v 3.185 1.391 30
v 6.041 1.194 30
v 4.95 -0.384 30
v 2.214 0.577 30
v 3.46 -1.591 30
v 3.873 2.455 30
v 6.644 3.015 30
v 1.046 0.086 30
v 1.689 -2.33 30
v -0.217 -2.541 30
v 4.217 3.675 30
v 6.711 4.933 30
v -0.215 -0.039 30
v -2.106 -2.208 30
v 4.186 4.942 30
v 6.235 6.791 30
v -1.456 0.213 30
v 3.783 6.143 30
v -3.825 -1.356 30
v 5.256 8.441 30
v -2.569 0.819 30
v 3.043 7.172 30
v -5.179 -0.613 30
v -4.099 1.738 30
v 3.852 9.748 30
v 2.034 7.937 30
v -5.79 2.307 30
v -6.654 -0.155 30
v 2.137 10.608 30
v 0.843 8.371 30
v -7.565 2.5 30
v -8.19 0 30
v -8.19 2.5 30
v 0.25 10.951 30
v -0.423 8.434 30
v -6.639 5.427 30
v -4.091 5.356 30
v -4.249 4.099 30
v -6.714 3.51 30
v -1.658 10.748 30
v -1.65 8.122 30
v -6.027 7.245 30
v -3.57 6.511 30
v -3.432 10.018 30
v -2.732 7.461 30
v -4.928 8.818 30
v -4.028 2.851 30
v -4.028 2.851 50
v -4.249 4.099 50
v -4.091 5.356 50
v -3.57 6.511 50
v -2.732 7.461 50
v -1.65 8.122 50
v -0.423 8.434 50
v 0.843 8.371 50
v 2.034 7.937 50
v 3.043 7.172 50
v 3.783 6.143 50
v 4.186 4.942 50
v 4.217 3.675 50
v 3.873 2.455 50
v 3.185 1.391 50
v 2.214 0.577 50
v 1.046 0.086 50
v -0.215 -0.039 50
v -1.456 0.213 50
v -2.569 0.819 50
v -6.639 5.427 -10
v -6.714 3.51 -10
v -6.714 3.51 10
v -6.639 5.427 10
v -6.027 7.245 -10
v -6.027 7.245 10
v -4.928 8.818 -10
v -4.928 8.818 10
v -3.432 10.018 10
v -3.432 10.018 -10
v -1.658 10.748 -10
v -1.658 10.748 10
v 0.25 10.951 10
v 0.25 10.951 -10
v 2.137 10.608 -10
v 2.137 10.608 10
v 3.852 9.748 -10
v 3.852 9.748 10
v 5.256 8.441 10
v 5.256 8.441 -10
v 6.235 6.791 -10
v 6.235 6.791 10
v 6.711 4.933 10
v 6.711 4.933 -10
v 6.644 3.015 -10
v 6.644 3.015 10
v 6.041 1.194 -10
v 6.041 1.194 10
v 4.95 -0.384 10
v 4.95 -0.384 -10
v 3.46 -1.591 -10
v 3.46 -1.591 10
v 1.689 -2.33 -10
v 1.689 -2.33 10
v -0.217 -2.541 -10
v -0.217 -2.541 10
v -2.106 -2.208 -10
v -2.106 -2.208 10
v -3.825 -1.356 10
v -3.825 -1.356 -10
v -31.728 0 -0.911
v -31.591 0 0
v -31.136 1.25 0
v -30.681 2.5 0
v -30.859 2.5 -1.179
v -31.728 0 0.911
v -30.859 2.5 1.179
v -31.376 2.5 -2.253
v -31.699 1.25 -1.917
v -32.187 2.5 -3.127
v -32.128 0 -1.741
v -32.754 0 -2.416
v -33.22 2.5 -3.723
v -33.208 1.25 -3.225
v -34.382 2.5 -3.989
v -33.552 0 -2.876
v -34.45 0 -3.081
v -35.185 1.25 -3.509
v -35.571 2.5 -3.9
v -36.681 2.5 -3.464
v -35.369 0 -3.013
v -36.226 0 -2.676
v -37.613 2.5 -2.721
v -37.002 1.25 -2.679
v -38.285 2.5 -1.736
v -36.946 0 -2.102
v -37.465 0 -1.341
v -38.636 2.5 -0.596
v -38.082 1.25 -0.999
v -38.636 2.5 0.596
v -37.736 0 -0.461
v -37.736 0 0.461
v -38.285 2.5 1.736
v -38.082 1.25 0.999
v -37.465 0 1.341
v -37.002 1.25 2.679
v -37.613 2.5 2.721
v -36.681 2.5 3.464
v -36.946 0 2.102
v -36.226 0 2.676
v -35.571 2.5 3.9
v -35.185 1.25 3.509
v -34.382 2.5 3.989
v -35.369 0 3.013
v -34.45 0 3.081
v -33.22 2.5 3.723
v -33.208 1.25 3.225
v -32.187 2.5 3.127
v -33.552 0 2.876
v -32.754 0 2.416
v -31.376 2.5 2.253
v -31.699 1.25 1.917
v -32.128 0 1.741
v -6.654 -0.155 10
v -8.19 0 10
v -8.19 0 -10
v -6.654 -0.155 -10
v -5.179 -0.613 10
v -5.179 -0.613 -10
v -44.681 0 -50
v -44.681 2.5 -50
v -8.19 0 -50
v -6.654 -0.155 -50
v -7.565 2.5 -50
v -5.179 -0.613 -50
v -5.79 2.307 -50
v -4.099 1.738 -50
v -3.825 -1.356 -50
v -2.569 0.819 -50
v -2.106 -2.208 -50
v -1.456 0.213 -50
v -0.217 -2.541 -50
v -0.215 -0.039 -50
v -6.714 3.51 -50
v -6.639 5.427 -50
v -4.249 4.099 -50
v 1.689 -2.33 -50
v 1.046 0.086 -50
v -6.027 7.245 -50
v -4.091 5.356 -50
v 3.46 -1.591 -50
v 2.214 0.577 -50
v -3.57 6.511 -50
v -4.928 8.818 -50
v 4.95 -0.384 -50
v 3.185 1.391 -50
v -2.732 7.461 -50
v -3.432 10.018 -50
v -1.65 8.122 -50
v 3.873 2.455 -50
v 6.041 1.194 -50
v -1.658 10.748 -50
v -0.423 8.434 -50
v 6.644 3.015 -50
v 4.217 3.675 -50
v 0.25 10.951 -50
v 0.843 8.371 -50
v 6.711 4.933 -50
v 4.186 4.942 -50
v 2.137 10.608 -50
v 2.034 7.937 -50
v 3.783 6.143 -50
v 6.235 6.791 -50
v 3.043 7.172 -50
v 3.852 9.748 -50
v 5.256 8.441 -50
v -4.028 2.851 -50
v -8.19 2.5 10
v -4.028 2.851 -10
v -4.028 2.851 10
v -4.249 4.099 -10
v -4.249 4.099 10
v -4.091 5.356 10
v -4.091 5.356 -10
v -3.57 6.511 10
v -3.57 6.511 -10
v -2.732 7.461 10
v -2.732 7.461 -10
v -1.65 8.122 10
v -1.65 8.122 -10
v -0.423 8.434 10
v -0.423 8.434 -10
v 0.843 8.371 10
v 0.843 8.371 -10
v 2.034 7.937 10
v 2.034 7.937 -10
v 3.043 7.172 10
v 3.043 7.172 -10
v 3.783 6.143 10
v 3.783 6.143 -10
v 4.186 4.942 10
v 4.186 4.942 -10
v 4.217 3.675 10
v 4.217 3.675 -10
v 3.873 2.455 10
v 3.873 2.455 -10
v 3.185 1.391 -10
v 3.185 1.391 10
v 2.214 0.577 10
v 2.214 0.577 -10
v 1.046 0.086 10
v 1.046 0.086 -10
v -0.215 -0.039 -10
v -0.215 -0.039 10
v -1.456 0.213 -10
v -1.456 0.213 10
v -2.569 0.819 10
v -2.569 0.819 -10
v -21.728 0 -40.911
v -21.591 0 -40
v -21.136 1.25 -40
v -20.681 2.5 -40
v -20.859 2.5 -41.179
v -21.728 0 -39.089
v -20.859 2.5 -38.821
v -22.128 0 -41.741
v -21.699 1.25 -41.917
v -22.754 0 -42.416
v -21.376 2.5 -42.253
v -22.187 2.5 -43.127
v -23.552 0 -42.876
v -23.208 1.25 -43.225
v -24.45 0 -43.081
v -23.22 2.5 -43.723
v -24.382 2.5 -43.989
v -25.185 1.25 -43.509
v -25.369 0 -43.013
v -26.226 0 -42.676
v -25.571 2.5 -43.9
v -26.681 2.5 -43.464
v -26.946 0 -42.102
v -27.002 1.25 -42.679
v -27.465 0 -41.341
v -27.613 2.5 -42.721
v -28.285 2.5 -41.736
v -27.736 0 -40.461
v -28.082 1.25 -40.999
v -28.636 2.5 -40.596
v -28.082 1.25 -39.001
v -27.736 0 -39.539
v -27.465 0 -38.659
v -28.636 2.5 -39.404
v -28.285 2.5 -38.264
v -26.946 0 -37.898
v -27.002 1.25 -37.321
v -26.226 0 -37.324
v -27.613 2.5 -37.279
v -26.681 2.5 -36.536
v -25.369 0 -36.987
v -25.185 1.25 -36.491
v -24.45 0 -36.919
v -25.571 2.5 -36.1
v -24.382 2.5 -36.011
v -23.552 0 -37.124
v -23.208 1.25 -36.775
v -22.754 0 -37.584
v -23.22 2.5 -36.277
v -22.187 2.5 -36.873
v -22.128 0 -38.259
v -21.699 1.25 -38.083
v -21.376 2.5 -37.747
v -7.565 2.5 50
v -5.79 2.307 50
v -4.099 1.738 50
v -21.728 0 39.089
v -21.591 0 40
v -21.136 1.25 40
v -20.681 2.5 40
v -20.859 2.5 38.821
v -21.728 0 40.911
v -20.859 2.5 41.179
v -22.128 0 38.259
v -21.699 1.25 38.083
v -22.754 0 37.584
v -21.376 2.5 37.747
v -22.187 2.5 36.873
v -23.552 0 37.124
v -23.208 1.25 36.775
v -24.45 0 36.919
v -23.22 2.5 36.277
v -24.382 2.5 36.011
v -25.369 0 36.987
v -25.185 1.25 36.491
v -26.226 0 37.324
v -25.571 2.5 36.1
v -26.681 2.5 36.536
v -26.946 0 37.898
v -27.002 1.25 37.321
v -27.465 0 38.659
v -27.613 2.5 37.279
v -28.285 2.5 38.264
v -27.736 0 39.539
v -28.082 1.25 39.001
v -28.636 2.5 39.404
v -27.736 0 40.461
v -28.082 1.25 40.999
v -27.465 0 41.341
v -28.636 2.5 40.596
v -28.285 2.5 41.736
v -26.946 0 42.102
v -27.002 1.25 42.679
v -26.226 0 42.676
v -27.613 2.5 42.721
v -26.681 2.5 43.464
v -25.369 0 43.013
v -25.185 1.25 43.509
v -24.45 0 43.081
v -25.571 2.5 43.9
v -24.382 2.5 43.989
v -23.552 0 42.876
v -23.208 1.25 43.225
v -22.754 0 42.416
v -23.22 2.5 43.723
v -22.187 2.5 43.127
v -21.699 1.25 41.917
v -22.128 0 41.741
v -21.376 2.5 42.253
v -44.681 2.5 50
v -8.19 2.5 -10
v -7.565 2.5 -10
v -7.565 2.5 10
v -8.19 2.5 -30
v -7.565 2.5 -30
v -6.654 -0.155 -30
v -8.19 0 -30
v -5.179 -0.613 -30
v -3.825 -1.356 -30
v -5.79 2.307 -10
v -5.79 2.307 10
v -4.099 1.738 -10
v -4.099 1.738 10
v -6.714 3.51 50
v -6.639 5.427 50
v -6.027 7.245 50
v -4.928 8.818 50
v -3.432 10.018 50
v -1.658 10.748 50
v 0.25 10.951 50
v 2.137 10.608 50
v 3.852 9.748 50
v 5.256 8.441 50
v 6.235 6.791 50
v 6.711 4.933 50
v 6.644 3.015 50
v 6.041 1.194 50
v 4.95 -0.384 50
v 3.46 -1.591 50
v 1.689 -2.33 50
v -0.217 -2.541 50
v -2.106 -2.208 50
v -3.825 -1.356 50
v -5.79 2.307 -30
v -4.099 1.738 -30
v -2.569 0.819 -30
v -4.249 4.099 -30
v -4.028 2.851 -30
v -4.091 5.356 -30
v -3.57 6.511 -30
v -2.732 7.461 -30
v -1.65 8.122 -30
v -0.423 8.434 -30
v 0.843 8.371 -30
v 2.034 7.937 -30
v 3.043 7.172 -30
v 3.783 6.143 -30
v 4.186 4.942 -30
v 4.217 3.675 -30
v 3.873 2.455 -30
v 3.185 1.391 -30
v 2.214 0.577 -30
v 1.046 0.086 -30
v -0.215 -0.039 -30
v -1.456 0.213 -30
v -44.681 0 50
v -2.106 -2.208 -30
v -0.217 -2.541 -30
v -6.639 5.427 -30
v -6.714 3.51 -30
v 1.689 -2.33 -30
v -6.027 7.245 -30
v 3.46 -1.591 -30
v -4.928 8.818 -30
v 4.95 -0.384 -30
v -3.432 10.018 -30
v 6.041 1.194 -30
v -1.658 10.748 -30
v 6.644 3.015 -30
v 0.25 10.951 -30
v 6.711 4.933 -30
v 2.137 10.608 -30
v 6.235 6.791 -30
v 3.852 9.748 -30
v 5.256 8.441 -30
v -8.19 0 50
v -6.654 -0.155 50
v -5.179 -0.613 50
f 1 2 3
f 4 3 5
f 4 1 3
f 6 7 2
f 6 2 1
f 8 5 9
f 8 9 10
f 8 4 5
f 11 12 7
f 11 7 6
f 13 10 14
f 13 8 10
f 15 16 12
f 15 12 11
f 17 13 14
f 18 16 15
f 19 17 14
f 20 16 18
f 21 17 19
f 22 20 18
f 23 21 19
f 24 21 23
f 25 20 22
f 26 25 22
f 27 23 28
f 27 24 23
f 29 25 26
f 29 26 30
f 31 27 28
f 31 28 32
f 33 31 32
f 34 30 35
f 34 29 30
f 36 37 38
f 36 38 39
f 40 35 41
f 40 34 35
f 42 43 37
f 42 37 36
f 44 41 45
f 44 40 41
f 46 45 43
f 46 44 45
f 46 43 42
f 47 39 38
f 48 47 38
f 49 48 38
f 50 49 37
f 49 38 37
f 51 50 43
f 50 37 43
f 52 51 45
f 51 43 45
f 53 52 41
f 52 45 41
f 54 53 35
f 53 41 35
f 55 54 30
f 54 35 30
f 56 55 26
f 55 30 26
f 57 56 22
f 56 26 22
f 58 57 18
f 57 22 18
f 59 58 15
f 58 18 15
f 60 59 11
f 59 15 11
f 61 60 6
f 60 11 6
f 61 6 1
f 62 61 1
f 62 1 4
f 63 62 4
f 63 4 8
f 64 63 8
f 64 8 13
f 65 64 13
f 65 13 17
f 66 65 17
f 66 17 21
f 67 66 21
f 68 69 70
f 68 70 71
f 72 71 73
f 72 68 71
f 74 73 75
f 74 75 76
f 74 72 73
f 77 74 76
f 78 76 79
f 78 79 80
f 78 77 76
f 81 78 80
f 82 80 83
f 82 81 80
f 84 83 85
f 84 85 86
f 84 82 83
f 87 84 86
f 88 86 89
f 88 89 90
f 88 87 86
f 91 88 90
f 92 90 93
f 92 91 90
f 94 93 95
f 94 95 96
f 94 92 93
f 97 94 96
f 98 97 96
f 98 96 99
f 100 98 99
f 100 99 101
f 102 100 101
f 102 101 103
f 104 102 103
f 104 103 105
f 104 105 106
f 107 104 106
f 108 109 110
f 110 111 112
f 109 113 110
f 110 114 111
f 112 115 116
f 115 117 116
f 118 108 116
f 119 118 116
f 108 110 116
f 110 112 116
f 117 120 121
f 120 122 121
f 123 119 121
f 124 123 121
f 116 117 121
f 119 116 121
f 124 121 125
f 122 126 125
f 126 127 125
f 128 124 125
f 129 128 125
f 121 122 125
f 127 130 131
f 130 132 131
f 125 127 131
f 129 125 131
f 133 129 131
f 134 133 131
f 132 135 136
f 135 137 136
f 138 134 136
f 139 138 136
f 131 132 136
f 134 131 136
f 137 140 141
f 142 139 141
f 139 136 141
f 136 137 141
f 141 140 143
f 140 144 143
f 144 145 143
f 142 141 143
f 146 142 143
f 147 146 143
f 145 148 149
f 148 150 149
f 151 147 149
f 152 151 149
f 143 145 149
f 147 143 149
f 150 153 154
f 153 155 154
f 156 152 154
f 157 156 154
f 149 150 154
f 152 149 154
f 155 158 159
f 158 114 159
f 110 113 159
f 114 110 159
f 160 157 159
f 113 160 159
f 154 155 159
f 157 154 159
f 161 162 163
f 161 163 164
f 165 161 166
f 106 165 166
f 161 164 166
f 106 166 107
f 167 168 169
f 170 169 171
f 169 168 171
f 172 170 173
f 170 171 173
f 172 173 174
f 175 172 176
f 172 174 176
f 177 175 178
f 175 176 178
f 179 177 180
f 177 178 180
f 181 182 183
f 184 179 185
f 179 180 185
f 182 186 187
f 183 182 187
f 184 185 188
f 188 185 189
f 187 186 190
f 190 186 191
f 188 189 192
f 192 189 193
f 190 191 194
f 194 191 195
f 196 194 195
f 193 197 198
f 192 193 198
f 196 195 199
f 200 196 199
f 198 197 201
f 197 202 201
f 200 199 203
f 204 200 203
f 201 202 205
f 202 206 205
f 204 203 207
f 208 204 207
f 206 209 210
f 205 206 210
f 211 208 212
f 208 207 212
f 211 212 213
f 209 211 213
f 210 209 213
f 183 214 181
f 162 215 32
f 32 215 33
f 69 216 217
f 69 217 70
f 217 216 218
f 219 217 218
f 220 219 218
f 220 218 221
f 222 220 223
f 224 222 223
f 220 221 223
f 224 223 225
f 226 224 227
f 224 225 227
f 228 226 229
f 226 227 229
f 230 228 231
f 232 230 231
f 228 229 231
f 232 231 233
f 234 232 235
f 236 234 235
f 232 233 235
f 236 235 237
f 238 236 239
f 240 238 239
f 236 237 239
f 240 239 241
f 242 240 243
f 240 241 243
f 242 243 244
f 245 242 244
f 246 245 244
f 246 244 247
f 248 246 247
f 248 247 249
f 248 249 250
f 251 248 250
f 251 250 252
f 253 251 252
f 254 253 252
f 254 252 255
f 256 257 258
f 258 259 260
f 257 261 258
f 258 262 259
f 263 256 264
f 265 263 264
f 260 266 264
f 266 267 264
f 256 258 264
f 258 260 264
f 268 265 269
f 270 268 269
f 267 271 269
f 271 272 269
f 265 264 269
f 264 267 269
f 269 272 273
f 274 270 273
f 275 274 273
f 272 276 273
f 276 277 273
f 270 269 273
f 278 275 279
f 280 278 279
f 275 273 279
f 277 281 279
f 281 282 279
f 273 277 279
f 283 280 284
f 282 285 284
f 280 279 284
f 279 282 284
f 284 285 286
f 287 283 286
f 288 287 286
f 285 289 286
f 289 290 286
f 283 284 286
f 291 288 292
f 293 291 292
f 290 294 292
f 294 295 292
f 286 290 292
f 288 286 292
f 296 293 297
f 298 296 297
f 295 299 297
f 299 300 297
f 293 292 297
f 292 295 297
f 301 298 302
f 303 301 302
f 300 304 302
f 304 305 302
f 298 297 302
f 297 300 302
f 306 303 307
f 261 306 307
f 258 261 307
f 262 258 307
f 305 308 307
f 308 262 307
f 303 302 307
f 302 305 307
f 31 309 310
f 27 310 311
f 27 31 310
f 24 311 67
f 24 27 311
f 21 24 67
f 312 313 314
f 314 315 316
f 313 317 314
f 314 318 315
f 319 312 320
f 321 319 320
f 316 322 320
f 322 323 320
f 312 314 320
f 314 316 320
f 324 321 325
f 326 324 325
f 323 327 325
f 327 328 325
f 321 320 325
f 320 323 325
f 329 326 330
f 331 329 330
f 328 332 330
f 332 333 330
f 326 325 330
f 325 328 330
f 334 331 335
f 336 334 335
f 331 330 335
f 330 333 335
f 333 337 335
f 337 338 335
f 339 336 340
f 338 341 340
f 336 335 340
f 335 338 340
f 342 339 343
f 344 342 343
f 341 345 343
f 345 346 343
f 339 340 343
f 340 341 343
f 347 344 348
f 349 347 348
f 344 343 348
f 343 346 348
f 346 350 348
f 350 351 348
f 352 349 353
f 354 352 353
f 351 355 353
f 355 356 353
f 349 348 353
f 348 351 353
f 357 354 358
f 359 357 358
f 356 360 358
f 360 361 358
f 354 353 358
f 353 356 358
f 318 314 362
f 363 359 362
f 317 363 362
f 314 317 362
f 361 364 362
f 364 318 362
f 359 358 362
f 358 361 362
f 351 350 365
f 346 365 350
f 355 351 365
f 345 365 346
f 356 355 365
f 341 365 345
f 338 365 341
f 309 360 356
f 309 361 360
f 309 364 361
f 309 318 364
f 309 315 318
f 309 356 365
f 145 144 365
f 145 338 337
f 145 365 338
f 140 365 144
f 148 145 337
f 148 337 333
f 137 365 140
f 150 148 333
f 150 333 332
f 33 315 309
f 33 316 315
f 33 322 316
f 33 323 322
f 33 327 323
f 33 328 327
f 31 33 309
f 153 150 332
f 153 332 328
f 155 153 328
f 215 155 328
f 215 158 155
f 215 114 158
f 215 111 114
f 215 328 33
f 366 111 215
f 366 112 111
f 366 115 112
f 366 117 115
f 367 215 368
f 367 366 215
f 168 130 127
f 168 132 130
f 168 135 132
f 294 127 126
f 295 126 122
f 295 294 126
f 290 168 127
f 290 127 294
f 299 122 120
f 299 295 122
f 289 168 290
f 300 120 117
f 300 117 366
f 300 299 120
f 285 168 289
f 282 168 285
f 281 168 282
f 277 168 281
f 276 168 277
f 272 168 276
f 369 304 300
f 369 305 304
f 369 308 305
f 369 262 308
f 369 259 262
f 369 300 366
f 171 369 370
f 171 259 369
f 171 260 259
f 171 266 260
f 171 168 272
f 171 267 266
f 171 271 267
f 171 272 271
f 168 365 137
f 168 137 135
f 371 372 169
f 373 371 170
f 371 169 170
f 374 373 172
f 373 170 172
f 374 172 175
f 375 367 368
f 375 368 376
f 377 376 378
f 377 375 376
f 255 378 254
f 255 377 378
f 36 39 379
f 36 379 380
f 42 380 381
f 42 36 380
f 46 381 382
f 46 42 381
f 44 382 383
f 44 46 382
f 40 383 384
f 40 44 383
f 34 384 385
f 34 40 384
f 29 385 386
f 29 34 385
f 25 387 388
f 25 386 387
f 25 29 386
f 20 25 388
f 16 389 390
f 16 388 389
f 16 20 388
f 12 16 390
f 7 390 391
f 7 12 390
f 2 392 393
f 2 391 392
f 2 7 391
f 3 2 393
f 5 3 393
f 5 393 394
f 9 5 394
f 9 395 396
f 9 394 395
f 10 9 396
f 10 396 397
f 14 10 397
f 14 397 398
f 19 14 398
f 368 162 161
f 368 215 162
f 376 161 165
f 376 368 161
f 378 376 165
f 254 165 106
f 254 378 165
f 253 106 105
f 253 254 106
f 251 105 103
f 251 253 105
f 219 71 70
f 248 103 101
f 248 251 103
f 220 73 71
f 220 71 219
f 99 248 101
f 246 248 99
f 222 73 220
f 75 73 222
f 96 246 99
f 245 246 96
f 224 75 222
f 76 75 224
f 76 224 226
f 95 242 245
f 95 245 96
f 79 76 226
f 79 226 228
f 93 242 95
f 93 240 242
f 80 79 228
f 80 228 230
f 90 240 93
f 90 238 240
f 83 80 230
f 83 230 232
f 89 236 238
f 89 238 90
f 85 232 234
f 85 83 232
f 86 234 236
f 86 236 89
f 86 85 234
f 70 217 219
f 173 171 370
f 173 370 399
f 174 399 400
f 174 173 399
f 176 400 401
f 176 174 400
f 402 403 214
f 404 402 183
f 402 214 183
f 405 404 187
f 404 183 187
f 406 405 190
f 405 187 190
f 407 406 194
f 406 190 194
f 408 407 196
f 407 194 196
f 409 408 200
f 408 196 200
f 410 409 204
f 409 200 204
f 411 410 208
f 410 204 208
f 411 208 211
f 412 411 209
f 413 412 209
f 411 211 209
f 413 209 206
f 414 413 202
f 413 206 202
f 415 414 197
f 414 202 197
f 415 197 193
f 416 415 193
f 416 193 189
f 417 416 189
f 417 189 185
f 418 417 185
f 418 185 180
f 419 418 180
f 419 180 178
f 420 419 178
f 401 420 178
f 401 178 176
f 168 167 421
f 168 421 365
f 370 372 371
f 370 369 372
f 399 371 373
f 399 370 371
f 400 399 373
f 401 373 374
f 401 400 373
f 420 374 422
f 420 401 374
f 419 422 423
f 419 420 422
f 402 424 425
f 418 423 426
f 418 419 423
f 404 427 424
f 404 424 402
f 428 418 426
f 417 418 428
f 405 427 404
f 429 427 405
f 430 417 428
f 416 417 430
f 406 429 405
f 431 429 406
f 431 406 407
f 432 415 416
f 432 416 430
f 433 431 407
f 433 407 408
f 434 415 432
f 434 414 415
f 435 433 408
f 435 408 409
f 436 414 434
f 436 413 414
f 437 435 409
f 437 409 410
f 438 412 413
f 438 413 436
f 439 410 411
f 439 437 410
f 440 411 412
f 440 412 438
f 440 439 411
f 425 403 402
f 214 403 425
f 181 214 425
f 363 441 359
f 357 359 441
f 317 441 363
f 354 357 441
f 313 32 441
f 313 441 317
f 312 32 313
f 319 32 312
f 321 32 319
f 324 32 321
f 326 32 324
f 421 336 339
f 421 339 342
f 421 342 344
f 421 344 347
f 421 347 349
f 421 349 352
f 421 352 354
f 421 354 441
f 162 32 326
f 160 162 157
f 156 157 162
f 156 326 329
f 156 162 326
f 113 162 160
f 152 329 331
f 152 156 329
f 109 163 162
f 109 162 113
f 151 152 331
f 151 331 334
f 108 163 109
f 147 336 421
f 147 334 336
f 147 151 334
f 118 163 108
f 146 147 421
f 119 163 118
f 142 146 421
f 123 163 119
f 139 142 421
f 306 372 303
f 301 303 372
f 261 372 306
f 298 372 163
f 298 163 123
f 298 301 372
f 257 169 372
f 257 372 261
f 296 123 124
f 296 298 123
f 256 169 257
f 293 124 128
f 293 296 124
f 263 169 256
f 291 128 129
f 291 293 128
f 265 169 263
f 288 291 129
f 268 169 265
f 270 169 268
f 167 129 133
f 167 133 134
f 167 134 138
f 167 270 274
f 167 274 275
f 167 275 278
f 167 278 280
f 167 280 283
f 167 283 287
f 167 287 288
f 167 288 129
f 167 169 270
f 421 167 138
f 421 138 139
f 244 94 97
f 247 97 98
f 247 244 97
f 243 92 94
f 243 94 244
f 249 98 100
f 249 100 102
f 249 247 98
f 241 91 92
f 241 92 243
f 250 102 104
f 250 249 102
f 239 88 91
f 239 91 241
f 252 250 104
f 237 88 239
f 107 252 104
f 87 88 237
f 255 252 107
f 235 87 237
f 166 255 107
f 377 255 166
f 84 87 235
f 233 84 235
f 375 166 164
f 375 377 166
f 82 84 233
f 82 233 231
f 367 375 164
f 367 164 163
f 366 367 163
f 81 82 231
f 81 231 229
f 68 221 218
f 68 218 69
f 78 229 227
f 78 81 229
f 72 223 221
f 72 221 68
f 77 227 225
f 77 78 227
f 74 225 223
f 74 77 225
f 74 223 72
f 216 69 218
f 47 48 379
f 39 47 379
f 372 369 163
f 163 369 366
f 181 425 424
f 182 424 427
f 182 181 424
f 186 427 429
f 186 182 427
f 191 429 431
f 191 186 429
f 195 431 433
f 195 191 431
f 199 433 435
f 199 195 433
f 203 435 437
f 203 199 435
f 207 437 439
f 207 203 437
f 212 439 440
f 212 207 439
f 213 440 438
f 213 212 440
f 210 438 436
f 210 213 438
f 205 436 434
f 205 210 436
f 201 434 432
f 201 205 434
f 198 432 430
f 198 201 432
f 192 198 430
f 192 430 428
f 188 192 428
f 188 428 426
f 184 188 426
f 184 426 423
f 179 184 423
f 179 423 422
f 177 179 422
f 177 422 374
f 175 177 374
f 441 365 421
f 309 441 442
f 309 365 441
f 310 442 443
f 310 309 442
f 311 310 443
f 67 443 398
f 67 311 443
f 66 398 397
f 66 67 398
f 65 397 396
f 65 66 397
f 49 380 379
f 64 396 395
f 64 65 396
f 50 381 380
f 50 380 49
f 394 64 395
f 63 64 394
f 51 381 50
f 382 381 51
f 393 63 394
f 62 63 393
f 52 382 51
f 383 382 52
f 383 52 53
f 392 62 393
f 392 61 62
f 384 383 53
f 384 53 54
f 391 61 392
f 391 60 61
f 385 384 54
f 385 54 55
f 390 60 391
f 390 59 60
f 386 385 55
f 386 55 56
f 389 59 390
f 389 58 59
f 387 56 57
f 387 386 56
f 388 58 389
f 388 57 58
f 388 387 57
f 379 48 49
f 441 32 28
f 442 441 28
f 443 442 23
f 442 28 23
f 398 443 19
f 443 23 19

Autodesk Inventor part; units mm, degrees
ref_plane "YZ Plane" through (0, 0, 0) normal (1, 0, 0) x (0, 1, 0)
ref_plane "XZ Plane" through (0, 0, 0) normal (0, 1, 0) x (-1, 0, 0)
ref_plane "XY Plane" through (0, 0, 0) normal (0, 0, 1) x (1, 0, 0)
sketch "Sketch1" plane through (0, 0, 0) normal (0, 0, 1) x (1, 0, 0)
  line L0 (-44.6809, 2.5) -> (-7.5647, 2.5)
  line L1 (-44.6809, 0) -> (-44.6809, 2.5)
  line L2 (0, 0) -> (0, 19.2246)
  arc A0 (-3.8253, -1.3563) -> (-6.7141, 3.5099) centre (0, 4.2052) ccw
  arc A1 (-2.5687, 0.8193) -> (-4.0285, 2.8511) centre (0, 4.2052) ccw
  arc A2 (-2.5687, 0.8193) -> (-7.5647, 2.5) centre (-7.5647, -5.7659) ccw
  line L3 (-4.0285, 2.8511) -> (-6.7141, 3.5099)
  arc A3 (-3.8253, -1.3563) -> (-8.1904, 0) centre (-8.1904, -7.7027) ccw
  line L4 (-8.1904, 0) -> (-44.6809, 0)
  line L5 (-36.0171, 0) -> (-5.5909, 0)
  line L6 (-5.2801, 0) -> (0, 0)
  point P0 (0, 10.9552)
  point P1 (0, 8.4552)
  dimension "d1" = 2.5
  dimension "d2" = 2.5
  dimension "d3" = 8.5
extrude "Extrusion1" add sketch "Sketch1" along normal mid plane 100 contours L0 A2 A1 L2 A0 A3 L4 L1 | A1 L3 A0 L2
sketch "Sketch2" plane through (-44.6809, 2.5, 50) normal (0, 1, 0) x (1, 0, 0)
  circle A0 centre (20, 90) radius 4
  circle A1 centre (10, 50) radius 4
  circle A2 centre (20, 10) radius 4
  line L0 (0, 100) -> (37.1161, 100) projected
  line L1 (0, 100) -> (0, 0) projected
  line L2 (37.1161, 0) -> (0, 0) projected
  point P0 (44.6809, 50)
  dimension "d6" = 8
  dimension "d7" = 8
  dimension "d8" = 8
  dimension "d9" = 10
  dimension "d10" = 20
  dimension "d11" = 20
  dimension "d12" = 10
  dimension "d13" = 10
  dimension "d14" = 50
extrude "Extrusion2" cut sketch "Sketch2" against normal up to next draft -20
sketch "Sketch4" plane through (-44.6809, 2.5, 50) normal (0, 1, 0) x (1, 0, 0)
  line L0 (36.4904, 100) -> (36.4904, 0) projected
  line L1 (36.4904, 80) -> (67.1636, 80)
  line L2 (67.1636, 80) -> (67.1636, 60)
  line L3 (67.1636, 60) -> (36.4904, 60)
  line L4 (36.4904, 60) -> (36.4904, 80)
  line L5 (36.4904, 40) -> (70.3914, 40)
  line L6 (70.3914, 40) -> (70.3914, 20)
  line L7 (70.3914, 20) -> (36.4904, 20)
  line L8 (36.4904, 20) -> (36.4904, 40)
  line L9 (37.1161, 0) -> (0, 0) projected
  line L10 (51.4309, 100) -> (37.9309, 100) projected
  point P0 (44.6809, 50)
  point P1 (37.9668, 100)
  point P2 (40.8556, 100)
  dimension "d22" = 20
  dimension "d23" = 20
  dimension "d24" = 20
  dimension "d25" = 20
extrude "Extrusion3" cut sketch "Sketch4" against normal mid plane 100
properties part number "Hinge1" material "Stainless Steel"
